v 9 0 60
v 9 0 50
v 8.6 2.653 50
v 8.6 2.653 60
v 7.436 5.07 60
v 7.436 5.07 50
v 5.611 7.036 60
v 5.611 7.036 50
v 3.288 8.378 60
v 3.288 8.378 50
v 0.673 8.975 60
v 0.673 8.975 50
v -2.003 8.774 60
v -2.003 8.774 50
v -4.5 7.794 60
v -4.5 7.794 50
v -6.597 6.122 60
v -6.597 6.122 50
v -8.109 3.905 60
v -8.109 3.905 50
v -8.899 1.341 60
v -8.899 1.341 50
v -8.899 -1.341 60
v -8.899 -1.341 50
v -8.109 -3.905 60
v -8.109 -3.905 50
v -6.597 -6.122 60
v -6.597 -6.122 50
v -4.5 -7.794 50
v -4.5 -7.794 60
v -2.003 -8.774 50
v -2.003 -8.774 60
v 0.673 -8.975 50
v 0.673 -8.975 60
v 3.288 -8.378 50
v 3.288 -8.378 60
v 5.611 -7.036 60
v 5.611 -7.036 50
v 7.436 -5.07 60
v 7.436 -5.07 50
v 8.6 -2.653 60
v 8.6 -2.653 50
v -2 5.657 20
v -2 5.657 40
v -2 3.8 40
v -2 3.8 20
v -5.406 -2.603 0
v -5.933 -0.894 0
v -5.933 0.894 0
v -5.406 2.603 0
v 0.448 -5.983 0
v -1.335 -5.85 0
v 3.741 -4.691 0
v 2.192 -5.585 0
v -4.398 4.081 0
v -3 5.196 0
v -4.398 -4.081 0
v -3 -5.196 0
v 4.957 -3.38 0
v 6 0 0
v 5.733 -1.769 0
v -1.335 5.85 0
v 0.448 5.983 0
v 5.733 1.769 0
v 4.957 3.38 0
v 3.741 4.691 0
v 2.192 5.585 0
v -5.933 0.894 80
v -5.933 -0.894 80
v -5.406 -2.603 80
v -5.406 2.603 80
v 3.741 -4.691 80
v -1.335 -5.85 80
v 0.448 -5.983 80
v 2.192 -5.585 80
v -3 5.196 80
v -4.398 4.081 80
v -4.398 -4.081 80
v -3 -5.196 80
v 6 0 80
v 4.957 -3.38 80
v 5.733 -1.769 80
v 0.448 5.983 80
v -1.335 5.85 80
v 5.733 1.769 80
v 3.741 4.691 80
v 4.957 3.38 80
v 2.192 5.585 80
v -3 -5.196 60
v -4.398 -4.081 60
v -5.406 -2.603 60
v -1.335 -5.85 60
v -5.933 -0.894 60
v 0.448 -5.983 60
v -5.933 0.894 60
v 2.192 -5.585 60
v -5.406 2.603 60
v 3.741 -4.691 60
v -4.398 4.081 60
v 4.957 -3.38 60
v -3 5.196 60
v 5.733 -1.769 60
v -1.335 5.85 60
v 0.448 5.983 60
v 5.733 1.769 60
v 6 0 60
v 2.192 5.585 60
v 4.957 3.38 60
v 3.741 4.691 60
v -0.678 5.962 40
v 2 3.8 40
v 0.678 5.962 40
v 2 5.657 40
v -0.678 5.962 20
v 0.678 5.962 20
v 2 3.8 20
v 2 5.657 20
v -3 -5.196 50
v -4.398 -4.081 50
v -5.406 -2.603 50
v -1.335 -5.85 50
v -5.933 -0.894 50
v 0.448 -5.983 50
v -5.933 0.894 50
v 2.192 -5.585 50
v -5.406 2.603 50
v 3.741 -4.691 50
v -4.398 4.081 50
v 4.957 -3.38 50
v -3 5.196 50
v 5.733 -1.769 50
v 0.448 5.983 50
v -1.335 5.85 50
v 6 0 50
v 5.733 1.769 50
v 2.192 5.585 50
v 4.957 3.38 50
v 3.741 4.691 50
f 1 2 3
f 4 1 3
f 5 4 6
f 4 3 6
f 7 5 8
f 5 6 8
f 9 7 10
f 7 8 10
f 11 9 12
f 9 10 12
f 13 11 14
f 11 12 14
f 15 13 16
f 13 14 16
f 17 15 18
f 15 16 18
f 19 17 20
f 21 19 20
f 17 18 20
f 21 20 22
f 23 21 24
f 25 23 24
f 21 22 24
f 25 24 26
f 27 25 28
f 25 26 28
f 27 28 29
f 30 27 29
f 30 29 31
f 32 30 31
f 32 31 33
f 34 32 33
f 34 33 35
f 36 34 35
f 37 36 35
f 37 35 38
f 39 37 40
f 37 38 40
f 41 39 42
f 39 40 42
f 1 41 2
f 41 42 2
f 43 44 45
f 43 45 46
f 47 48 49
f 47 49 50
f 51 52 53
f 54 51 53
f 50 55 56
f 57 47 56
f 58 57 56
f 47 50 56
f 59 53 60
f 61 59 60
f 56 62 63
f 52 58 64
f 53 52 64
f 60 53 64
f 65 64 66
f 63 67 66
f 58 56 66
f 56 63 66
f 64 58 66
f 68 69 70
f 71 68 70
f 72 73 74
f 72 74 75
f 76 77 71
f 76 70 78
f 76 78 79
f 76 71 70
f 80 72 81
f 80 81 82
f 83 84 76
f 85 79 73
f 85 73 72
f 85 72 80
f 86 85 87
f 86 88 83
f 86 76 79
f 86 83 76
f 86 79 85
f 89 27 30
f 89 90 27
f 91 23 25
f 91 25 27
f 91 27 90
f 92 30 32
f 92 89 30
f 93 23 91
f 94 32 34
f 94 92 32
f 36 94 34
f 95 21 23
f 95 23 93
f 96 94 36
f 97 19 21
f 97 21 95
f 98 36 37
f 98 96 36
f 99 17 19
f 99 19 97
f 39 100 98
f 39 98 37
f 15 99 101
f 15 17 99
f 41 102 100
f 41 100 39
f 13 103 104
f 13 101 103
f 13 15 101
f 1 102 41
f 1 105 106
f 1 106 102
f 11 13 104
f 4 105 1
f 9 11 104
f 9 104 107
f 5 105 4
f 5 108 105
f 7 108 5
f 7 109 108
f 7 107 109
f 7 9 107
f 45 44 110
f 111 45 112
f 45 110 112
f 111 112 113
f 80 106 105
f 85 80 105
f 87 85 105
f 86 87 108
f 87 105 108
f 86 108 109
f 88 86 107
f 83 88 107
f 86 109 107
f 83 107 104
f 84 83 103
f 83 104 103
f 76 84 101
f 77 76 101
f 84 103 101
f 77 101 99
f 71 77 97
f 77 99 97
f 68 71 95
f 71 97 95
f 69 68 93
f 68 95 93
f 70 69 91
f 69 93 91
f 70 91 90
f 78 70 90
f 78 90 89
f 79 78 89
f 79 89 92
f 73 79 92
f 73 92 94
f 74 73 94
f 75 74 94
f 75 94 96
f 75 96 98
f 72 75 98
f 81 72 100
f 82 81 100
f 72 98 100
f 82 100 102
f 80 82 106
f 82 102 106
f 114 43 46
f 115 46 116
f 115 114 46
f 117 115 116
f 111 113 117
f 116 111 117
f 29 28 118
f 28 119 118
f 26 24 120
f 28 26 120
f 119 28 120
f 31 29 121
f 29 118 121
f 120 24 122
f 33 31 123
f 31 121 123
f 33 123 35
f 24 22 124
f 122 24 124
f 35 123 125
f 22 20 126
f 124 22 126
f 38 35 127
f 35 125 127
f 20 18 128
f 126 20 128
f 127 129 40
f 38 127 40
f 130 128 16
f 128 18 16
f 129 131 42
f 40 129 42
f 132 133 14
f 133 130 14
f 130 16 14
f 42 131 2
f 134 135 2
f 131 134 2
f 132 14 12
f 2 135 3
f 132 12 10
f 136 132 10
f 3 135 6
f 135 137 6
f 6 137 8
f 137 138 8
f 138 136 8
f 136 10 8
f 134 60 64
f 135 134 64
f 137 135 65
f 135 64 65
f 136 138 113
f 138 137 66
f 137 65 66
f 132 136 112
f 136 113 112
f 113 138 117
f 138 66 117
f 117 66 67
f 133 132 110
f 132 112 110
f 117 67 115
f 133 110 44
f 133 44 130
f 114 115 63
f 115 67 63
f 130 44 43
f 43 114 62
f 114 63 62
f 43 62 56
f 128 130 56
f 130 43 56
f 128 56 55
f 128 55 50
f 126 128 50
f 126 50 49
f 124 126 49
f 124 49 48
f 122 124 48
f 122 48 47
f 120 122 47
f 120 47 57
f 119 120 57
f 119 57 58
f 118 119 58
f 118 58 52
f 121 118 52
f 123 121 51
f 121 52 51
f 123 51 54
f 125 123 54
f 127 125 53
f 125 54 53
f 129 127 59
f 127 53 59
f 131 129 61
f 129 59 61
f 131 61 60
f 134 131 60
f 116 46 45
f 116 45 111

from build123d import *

# Parameters (mm, degrees)
SKETCH2_R           = 6
BOSS_EXTRUDE1_DEPTH = 50
SKETCH3_R           = 9
BOSS_EXTRUDE2_DEPTH = 10
SKETCH4_R           = 6
BOSS_EXTRUDE3_DEPTH = 20
SKETCH6_W           = 4
SKETCH6_H           = 20
CUT_EXTRUDE1_DEPTH  = 2.2


with BuildPart() as part:
    # Sketch2 → Boss-Extrude1 (new body)
    with BuildSketch(Plane.XY):
        Circle(SKETCH2_R)
    extrude(amount=BOSS_EXTRUDE1_DEPTH)

    # Sketch3 → Boss-Extrude2 (add)
    with BuildSketch(Plane.XY.offset(50)):
        Circle(SKETCH3_R)
    extrude(amount=BOSS_EXTRUDE2_DEPTH)

    # Sketch4 → Boss-Extrude3 (add)
    with BuildSketch(Plane.XY.offset(60)):
        Circle(SKETCH4_R)
    extrude(amount=BOSS_EXTRUDE3_DEPTH)

    # Sketch6 → Cut-Extrude1 (cut)
    with BuildSketch(Plane(origin=(0, 6, 0), x_dir=(1, 0, 0), z_dir=(0, 1, 0))):
        with Locations((0, -30)):
            Rectangle(SKETCH6_W, SKETCH6_H)
    extrude(amount=-CUT_EXTRUDE1_DEPTH, mode=Mode.SUBTRACT)


solid = part.part
